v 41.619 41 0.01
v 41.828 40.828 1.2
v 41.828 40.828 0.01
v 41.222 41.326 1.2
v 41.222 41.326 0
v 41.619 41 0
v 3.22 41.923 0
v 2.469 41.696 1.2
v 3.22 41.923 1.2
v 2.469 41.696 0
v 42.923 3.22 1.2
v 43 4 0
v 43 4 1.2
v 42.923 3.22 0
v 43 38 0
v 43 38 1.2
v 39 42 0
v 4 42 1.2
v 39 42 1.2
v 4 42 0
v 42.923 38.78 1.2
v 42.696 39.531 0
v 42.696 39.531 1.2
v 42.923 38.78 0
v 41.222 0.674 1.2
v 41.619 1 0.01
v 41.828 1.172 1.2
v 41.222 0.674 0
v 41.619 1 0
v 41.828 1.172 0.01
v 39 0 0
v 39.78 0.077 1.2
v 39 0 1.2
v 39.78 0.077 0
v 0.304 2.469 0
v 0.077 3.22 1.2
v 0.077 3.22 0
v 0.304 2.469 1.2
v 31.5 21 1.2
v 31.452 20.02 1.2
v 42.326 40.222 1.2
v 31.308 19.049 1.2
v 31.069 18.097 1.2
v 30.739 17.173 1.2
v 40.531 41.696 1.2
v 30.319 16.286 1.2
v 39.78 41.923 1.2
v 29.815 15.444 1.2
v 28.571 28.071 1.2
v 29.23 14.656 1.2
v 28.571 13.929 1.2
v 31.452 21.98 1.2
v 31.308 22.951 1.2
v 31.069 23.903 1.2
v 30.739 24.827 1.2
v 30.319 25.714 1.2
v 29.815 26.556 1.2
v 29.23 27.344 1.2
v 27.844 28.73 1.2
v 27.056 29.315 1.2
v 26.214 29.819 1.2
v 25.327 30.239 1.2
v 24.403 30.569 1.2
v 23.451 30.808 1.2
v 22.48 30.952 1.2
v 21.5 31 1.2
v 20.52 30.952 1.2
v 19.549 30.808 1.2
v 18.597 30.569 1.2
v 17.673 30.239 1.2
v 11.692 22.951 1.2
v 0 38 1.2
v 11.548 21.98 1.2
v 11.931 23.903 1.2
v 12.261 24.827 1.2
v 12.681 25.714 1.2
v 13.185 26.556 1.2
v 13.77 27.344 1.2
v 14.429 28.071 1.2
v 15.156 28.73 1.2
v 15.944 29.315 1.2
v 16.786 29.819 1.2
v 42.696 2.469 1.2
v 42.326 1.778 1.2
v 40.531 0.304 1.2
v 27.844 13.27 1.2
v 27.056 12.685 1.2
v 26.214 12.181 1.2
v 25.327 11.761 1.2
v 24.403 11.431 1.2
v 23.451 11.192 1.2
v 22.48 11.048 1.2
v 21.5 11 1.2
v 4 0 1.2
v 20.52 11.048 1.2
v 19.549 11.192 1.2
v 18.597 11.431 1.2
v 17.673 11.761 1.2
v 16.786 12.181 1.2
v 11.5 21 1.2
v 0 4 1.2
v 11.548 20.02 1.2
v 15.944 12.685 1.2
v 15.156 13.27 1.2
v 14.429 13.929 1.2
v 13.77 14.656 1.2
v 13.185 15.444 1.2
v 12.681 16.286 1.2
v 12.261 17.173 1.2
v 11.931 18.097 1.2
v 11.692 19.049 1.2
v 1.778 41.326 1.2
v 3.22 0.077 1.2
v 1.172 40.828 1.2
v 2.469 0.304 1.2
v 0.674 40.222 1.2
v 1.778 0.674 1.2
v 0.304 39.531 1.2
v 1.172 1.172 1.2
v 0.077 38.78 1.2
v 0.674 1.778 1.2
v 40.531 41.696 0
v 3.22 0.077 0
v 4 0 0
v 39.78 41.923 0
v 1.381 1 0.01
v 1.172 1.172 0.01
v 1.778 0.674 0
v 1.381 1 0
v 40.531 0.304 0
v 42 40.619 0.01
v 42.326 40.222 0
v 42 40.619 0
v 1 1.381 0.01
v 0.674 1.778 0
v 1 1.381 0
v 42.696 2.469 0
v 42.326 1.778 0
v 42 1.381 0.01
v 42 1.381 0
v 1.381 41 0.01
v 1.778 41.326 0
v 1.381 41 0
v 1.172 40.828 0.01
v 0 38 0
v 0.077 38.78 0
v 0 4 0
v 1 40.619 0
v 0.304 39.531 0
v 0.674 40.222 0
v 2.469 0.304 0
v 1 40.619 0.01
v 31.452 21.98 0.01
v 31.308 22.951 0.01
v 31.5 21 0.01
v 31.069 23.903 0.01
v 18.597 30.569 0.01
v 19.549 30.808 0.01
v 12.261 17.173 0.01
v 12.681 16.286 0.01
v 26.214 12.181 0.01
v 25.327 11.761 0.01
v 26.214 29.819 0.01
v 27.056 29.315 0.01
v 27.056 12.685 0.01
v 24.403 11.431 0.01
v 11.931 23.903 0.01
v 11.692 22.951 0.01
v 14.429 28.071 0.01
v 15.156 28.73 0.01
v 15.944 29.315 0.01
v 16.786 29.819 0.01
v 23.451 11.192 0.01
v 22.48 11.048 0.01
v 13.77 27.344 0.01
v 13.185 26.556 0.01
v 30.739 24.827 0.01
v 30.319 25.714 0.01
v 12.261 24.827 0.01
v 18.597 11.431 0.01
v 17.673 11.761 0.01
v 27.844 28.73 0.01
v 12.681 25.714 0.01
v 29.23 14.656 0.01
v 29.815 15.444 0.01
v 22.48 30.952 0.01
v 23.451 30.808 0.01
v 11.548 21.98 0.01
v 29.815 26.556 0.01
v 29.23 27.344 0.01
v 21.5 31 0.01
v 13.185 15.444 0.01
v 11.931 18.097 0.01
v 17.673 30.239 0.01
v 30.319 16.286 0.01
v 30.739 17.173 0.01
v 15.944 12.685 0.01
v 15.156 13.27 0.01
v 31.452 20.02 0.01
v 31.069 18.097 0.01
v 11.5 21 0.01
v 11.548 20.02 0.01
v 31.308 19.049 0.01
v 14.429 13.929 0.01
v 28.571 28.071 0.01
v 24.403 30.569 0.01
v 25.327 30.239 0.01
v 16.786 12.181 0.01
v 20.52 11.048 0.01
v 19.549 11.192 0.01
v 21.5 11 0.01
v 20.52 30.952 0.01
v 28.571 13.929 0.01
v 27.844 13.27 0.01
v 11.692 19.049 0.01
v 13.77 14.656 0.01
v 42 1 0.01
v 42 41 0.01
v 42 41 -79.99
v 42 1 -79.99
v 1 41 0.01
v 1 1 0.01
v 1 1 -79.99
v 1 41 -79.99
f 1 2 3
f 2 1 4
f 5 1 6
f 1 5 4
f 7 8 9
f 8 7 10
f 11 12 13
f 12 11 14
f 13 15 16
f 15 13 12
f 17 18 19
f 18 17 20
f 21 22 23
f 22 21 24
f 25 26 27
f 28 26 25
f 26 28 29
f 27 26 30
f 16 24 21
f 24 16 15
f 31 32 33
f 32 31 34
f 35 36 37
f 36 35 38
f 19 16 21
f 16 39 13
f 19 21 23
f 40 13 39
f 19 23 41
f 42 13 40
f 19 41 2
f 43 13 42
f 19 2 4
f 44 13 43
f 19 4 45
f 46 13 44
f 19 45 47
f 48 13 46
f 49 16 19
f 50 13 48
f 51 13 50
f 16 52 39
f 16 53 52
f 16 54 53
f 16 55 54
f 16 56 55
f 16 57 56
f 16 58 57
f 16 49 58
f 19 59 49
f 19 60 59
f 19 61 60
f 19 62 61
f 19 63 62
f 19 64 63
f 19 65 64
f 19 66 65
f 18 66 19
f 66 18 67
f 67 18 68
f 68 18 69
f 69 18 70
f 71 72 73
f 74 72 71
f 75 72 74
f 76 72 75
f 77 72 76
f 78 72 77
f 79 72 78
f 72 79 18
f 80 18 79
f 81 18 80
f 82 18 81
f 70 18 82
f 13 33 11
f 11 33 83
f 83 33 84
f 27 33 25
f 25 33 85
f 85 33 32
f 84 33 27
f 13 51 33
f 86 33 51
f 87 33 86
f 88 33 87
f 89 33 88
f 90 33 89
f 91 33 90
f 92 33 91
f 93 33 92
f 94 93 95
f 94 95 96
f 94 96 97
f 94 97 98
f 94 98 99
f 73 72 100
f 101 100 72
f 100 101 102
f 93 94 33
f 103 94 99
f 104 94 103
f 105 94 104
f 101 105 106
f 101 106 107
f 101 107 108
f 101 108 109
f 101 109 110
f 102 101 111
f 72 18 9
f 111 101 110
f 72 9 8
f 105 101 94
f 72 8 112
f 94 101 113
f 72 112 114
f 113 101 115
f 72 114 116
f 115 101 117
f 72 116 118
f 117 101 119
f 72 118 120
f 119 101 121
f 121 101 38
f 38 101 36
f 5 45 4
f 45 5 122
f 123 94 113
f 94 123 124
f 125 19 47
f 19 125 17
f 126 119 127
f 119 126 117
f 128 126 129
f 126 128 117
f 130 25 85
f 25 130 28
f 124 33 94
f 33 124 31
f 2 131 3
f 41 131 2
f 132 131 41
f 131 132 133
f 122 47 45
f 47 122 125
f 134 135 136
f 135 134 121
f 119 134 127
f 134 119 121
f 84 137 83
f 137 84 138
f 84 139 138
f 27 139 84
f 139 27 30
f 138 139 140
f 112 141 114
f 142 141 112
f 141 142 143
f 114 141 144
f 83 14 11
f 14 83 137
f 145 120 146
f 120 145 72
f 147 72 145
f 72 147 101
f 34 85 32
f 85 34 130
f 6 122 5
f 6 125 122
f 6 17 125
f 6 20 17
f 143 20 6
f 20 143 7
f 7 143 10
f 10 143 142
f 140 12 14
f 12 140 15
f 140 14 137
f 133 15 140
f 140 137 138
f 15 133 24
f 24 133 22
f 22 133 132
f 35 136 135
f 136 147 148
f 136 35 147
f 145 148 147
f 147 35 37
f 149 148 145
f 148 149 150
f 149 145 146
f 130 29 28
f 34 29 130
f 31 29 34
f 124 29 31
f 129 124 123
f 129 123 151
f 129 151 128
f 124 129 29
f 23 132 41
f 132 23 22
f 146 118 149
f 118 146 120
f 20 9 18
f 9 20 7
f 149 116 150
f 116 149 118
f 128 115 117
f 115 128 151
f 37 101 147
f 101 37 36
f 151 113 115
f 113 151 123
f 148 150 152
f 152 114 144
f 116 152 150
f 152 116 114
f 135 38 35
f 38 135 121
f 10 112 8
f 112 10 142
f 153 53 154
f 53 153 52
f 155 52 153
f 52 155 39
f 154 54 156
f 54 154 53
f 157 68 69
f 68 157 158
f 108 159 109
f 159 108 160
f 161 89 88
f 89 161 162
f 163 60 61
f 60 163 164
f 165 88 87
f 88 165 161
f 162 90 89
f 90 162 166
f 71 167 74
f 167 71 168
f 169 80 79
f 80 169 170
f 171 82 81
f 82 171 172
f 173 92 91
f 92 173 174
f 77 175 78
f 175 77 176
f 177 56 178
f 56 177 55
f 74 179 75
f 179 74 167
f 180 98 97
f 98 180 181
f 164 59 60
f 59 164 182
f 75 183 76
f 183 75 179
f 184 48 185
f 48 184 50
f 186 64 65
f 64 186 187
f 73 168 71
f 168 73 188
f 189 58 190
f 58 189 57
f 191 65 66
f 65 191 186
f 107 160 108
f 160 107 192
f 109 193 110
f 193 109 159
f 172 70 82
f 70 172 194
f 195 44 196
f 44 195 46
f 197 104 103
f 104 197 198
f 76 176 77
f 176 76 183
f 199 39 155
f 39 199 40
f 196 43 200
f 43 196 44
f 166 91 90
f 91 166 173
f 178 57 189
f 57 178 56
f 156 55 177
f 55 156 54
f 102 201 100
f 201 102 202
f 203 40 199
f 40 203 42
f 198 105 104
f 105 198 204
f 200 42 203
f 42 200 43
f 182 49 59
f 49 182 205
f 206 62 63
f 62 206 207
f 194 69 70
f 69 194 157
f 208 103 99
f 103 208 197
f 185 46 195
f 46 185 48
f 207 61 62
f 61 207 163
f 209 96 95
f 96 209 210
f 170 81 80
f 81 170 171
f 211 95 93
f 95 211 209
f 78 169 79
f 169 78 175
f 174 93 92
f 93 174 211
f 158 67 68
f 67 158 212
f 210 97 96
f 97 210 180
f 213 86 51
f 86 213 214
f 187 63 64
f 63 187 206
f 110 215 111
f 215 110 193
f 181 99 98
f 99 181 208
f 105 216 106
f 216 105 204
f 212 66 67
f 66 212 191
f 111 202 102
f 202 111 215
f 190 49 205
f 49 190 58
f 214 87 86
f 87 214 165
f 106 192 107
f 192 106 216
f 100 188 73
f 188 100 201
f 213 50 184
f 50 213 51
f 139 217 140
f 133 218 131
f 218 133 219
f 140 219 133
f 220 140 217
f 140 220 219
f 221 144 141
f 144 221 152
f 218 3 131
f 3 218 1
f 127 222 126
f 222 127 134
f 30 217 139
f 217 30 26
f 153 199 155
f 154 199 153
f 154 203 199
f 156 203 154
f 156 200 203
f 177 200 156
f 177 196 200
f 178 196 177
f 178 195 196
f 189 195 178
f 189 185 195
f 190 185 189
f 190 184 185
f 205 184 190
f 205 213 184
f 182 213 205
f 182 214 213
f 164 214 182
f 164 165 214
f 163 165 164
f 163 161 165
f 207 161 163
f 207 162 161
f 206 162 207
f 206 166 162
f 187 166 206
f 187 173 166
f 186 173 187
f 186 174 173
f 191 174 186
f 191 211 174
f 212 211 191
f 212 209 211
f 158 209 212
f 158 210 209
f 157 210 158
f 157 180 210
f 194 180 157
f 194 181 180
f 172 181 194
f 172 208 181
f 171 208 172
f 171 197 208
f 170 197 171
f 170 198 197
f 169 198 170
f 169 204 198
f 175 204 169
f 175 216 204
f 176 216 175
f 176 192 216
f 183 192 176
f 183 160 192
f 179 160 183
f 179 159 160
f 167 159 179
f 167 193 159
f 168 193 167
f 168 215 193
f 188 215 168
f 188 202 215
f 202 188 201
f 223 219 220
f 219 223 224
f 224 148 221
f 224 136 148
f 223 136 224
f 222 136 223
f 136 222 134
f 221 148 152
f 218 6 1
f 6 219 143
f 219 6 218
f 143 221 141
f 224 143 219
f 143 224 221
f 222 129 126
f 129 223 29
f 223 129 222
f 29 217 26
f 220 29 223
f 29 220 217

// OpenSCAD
crad    = 4;
height  = 1.2;

size    = [43,42];
battery = [41,40,80];

translate([1, 1, -battery[2]+0.01]) color("green") cube(battery);

difference() {
hull() {
    translate([crad, crad]) cylinder($fn=32, h=height, r=crad);
    translate([size[0]-crad, crad]) cylinder($fn=32, h=height, r=crad);
    translate([crad, size[1]-crad]) cylinder($fn=32, h=height, r=crad);
    translate([size[0]-crad, size[1]-crad]) cylinder($fn=32, h=height, r=crad);
    
}
    translate([size[0]/2, size[1]/2, -2]) cylinder($fn=64, h=10, d=20);
}
